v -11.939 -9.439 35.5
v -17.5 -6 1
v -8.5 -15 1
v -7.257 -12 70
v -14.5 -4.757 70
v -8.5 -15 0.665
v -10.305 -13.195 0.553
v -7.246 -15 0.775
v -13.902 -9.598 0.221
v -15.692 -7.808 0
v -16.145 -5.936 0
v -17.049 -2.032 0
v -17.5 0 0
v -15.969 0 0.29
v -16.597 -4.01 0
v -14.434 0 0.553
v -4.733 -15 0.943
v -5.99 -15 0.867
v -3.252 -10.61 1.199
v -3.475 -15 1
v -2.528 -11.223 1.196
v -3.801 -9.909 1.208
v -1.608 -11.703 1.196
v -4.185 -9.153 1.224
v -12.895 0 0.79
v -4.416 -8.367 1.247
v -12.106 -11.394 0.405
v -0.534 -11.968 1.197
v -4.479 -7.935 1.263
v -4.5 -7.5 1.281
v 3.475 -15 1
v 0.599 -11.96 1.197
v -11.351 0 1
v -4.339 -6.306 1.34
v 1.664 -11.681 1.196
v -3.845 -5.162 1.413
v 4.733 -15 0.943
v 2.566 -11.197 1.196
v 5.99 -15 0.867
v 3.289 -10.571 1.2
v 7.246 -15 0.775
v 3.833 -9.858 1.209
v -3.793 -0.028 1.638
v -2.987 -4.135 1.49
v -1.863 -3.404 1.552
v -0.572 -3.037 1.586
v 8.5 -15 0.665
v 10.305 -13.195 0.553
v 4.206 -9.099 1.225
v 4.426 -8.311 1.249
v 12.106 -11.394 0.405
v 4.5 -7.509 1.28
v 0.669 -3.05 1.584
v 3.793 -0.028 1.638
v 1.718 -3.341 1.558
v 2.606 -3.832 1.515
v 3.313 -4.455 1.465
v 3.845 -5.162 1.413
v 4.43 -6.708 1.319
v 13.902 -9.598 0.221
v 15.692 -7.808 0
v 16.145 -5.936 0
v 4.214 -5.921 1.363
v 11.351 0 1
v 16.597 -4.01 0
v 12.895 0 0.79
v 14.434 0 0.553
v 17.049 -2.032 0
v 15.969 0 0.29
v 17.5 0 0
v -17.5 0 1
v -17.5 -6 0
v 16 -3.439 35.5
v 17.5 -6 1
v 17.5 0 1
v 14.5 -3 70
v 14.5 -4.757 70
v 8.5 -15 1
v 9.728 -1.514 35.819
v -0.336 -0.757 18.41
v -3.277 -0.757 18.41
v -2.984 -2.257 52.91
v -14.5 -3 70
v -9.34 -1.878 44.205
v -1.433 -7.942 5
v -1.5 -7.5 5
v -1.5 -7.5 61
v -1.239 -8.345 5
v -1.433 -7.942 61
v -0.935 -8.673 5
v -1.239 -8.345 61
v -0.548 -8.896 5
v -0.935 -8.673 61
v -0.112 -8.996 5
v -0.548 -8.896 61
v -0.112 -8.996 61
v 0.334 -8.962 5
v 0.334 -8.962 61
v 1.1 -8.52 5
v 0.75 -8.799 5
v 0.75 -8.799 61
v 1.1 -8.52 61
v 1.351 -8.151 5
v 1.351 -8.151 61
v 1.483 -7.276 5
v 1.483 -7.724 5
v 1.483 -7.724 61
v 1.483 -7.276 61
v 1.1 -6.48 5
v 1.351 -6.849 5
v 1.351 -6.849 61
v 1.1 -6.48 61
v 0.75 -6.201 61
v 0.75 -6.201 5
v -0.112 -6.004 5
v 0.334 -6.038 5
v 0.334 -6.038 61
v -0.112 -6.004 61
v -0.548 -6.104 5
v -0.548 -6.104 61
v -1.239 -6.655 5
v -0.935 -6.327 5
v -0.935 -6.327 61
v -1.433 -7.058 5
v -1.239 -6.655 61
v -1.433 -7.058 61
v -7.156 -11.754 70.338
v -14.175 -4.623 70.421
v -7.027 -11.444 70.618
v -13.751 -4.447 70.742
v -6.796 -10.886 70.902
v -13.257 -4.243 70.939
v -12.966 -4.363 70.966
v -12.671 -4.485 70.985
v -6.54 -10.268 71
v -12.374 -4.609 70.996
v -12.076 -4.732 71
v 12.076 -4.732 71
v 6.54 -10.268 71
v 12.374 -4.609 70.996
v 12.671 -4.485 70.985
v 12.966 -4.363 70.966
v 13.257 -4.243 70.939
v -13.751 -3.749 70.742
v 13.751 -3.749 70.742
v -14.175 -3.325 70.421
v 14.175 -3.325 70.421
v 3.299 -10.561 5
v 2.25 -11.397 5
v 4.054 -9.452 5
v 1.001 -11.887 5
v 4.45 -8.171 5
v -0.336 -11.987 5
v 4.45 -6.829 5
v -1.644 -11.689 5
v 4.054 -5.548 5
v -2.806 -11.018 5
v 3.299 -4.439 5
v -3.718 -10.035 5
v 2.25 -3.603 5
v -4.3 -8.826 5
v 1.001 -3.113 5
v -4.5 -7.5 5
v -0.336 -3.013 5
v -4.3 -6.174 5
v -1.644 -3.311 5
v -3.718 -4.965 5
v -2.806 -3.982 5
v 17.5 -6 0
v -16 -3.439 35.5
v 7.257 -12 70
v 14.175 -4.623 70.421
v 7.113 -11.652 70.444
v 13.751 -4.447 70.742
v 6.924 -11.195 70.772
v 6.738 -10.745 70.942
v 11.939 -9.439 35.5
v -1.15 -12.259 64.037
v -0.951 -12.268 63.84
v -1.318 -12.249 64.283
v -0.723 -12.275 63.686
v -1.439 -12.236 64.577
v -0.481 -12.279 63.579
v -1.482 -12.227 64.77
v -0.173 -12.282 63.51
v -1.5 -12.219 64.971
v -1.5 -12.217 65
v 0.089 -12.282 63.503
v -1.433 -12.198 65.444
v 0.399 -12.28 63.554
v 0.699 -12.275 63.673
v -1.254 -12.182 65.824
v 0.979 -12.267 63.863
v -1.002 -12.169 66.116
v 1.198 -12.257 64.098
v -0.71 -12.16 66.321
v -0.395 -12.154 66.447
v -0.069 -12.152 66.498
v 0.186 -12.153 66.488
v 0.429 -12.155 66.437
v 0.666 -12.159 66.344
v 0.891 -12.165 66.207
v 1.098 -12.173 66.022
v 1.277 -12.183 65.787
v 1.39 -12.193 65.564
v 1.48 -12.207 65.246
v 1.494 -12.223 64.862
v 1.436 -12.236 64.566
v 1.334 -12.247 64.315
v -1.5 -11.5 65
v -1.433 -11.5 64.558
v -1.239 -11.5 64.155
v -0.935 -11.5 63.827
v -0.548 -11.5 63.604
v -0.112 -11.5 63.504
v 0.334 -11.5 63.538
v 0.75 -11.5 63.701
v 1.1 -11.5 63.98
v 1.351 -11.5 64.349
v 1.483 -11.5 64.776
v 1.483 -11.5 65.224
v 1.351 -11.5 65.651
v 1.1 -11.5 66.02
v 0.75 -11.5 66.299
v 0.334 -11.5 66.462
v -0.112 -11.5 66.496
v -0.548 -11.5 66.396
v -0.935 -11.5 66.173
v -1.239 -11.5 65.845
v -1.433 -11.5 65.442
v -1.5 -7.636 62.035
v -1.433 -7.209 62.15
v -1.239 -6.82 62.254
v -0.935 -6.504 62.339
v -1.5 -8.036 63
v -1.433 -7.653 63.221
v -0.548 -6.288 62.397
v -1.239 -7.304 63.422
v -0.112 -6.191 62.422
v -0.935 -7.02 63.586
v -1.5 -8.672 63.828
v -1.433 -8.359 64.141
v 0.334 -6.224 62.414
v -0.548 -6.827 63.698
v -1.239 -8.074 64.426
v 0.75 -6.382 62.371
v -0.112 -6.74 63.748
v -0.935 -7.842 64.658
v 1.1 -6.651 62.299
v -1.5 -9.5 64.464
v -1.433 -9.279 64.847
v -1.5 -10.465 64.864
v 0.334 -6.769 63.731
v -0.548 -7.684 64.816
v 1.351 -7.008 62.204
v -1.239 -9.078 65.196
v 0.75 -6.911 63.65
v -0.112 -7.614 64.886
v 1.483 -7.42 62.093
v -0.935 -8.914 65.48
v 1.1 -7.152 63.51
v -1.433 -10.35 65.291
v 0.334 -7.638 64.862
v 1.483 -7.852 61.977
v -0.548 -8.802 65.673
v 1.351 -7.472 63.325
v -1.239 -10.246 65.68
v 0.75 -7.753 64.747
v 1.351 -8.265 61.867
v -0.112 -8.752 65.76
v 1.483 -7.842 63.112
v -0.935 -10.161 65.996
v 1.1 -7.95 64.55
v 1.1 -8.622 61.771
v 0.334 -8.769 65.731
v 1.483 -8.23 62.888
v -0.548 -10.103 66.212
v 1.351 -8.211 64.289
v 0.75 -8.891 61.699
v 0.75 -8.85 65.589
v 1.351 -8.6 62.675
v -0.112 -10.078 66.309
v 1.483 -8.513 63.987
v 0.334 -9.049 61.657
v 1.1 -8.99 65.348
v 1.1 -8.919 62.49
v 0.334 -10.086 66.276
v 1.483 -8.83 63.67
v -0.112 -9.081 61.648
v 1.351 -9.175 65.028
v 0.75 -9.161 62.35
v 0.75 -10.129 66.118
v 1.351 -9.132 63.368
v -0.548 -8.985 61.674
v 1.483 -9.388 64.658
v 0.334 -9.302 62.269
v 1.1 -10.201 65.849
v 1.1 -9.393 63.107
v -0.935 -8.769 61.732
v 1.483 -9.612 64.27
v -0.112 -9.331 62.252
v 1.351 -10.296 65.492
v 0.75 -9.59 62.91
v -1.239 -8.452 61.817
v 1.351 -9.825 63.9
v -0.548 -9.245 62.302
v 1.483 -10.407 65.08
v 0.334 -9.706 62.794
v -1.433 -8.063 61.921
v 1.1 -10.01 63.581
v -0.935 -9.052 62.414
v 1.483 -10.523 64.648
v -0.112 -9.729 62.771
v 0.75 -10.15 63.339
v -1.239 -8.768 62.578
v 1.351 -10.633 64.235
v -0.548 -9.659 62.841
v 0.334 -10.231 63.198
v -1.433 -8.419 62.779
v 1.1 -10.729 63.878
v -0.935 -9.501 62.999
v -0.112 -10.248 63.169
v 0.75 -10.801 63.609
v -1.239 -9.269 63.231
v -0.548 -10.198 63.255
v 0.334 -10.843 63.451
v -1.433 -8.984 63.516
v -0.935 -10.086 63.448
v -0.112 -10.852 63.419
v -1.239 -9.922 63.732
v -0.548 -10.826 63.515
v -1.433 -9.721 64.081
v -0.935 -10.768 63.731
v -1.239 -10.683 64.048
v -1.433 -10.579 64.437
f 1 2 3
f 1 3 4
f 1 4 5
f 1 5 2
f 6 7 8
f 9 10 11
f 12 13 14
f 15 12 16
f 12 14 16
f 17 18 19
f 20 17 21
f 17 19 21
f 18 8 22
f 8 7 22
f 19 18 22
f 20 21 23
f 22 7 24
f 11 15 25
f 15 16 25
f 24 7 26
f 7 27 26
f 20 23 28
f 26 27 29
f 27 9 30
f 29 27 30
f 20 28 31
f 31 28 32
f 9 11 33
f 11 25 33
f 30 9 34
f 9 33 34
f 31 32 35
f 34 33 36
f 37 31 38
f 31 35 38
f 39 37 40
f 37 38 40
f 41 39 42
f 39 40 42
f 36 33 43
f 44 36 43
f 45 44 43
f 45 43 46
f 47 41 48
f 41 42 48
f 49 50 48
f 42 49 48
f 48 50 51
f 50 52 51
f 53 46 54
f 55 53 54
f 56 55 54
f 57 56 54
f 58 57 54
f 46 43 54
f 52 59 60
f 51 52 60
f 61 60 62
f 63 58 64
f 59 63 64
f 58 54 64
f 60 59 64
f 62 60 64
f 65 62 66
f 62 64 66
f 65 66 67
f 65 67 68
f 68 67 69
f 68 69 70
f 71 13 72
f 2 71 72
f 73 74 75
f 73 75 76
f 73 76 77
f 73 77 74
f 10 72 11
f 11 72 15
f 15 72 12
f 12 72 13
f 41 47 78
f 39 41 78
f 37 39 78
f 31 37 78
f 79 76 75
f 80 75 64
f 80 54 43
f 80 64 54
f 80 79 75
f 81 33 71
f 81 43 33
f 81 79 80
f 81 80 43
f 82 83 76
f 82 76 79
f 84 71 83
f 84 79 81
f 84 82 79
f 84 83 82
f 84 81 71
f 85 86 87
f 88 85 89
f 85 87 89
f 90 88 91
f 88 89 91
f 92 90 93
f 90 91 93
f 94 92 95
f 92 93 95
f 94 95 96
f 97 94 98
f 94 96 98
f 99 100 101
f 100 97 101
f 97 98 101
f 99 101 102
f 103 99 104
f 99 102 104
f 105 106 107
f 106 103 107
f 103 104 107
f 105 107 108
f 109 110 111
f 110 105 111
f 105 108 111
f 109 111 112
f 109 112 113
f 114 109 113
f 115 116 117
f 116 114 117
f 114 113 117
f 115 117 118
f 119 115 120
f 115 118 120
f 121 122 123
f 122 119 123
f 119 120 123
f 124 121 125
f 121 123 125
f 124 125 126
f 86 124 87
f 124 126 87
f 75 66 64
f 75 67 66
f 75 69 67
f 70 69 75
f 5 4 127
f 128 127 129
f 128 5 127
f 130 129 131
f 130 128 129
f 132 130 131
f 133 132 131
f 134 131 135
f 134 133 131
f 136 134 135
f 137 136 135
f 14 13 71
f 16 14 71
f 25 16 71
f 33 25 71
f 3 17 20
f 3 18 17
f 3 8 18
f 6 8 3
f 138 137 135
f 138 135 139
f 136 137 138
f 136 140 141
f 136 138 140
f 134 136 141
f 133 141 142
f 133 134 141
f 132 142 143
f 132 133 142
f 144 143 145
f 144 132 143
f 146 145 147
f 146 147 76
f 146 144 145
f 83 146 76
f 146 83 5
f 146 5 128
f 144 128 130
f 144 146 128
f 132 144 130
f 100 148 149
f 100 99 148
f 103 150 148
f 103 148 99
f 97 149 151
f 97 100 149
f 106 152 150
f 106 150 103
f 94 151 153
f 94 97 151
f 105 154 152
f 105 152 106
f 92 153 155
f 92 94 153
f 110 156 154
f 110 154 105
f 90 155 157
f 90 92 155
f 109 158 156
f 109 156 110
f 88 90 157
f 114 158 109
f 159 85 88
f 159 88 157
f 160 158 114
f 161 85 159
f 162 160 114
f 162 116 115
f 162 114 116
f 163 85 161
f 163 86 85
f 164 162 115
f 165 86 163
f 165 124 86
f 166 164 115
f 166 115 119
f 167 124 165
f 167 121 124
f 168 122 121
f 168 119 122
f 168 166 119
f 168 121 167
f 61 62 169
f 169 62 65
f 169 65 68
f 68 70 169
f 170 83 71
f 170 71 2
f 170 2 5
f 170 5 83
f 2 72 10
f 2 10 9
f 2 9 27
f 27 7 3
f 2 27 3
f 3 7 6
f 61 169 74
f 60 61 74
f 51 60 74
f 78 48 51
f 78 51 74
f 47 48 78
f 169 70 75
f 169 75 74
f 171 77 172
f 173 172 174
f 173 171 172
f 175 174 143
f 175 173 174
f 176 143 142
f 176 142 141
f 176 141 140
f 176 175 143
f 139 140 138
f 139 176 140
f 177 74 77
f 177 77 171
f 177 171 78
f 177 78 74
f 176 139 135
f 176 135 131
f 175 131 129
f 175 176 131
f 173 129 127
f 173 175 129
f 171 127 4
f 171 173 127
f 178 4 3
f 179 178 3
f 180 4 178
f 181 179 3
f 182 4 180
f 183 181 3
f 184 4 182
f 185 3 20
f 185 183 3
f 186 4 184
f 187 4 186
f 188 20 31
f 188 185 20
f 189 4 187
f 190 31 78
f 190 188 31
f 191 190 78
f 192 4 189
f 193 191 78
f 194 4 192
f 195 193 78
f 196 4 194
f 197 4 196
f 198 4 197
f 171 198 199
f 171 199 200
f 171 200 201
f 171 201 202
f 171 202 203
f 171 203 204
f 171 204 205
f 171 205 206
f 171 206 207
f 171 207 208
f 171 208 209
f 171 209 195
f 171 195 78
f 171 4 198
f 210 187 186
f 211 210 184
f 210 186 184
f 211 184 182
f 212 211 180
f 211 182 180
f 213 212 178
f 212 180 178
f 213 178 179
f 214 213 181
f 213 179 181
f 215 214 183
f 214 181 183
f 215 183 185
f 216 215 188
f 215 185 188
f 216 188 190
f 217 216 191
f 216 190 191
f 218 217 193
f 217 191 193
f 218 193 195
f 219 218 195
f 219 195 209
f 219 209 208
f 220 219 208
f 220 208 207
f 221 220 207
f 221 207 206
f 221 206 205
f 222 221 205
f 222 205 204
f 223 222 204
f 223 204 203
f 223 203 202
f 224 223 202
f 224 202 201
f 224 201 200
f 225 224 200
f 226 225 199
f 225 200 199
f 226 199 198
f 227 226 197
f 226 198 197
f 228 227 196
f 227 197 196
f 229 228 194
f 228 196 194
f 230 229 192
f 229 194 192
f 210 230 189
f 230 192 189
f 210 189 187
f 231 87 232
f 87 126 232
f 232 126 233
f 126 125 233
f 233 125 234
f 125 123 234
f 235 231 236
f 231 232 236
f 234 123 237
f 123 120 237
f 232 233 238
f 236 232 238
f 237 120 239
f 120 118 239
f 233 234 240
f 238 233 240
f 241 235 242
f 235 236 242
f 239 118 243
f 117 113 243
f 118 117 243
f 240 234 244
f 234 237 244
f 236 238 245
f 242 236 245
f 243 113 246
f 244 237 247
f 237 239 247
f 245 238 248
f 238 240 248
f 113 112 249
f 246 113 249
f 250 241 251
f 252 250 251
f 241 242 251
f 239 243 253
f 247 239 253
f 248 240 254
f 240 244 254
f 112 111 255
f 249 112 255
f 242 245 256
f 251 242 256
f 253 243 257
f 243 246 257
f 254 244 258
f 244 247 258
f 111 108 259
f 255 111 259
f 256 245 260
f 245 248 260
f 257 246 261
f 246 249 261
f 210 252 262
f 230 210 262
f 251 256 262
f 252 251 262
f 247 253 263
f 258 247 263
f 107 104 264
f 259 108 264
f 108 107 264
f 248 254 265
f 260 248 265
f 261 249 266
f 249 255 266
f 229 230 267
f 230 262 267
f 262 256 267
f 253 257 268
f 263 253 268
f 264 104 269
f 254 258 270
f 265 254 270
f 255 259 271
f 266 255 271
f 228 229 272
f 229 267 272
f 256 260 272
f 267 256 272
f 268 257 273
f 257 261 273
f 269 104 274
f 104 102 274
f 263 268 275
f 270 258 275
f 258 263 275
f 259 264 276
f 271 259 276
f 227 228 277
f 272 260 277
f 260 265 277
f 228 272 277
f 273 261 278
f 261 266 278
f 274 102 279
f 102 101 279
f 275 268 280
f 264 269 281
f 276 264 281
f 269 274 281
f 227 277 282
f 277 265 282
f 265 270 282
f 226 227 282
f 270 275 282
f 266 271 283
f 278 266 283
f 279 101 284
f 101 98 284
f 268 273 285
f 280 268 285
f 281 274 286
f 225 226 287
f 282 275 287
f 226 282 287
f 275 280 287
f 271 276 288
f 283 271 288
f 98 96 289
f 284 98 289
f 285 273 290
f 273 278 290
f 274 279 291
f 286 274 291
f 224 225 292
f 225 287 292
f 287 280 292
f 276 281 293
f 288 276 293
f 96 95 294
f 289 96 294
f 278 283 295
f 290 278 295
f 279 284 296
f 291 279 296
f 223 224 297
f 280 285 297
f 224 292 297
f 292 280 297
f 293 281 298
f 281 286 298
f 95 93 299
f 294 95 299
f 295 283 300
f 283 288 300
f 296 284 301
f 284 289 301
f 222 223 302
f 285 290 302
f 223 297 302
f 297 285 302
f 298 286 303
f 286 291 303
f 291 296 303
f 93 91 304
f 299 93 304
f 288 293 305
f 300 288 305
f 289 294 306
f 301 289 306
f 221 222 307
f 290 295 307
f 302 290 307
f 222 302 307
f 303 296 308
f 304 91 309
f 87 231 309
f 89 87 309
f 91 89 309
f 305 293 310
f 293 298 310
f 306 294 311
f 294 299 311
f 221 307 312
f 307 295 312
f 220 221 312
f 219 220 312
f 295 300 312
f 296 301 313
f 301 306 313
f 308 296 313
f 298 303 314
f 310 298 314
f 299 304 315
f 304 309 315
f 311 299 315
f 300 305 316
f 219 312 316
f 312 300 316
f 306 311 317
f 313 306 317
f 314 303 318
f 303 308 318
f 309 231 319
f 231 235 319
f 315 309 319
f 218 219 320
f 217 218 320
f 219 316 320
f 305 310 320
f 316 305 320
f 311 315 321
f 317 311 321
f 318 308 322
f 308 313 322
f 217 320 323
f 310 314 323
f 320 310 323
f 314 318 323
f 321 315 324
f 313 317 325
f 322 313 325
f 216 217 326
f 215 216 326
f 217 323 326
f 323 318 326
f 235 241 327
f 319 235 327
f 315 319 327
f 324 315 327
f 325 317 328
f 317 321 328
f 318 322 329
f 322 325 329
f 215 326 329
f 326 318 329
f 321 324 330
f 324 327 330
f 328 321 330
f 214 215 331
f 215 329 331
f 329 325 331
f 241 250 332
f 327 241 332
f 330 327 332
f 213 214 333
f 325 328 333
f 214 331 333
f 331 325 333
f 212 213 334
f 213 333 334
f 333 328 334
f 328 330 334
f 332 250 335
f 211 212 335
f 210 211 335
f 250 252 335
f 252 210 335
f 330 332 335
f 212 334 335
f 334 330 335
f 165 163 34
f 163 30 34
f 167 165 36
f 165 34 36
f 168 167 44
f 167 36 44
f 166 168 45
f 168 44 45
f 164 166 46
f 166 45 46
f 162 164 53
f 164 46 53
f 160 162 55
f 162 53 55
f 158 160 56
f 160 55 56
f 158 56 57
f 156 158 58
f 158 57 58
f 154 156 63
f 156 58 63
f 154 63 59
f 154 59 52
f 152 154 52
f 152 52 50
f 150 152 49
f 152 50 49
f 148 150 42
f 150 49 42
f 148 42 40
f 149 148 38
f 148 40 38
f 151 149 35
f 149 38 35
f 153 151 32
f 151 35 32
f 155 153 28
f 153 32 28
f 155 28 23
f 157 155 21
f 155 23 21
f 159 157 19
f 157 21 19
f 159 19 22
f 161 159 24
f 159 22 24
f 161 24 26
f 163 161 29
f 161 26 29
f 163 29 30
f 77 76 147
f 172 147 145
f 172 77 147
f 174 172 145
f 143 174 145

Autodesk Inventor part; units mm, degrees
ref_plane "YZ Plane" through (0, 0, 0) normal (1, 0, 0) x (0, 1, 0)
ref_plane "XZ Plane" through (0, 0, 0) normal (0, 1, 0) x (-1, 0, 0)
sketch "Sketch1" plane through (0, 0, 0) normal (0, 0, 1) x (1, 0, 0)
  line L0 (0, 0) -> (17.5, 0)
  line L1 (17.5, 0) -> (17.5, -6)
  line L2 (17.5, -6) -> (8.5, -15)
  line L3 (8.5, -15) -> (0, -15)
  line L4 (0, 0) -> (0, -15)
  line L5 (0, 0) -> (-17.5, 0)
  line L6 (-17.5, 0) -> (-17.5, -6)
  line L7 (-17.5, -6) -> (-8.5, -15)
  line L8 (-8.5, -15) -> (0, -15)
  dimension "d0" = 35
  dimension "d1" = 15
  dimension "d2" = 45
  dimension "d3" = 6
ref_plane "Work Plane1" through (0, 0, 70) normal (0, 0, 1) x (1, 0, 0)
sketch "Sketch2" plane through (0, 0, 70) normal (0, 0, 1) x (1, 0, 0)
  line L0 (-17.5, -6) -> (-8.5, -15) projected
  line L1 (-17.5, 0) -> (-17.5, -6) projected
  line L2 (0, 0) -> (-17.5, 0) projected
  line L3 (0, 0) -> (17.5, 0) projected
  line L4 (17.5, 0) -> (17.5, -6) projected
  line L5 (17.5, -6) -> (8.5, -15) projected
  line L6 (8.5, -15) -> (0, -15) projected
  line L7 (-8.5, -15) -> (0, -15) projected
  line L8 (-14.5, -4.7574) -> (-7.2574, -12)
  line L9 (-7.2574, -12) -> (0, -12)
  line L10 (0, -12) -> (7.2574, -12)
  line L11 (7.2574, -12) -> (14.5, -4.7574)
  line L12 (14.5, -4.7574) -> (14.5, -3)
  line L13 (14.5, -3) -> (0, -3)
  line L14 (0, -3) -> (-14.5, -3)
  line L15 (-14.5, -3) -> (-14.5, -4.7574)
  dimension "d5" = 3
extrude "Extrusion1" add sketch "Sketch1" along normal blind 1
extrude "Extrusion2" add sketch "Sketch2" along normal blind 1 contours L15 L14 L13 L12 L11 L10 L9 L8
loft "Loft1" add section 1 edges at (-13, -10.5, 1) (0, -15, 1) (13, -10.5, 1) (17.5, -3, 1) (0, 0, 1) (-17.5, -3, 1) section 2 edges at (0, -3, 70) (14.5, -3.8787, 70) (10.8787, -8.3787, 70) (0, -12, 70) (-10.8787, -8.3787, 70) (-14.5, -3.8787, 70)
sketch "Sketch6" plane through (0, 0, 0) normal (1, 0, 0) x (0, 1, 0)
  line L0 (-15, 1) -> (-12, 70) projected
  line L1 (-12, 70) -> (-12, 71) projected
  line L2 (-12, 71) -> (-3, 71) projected
  line L3 (-3, 71) -> (-3, 70) projected
  line L4 (-3, 70) -> (0, 1) projected
  line L5 (0, 1) -> (0, 0) projected
  line L6 (0, 0) -> (-15, 0) projected
  line L7 (-15, 0) -> (-15, 1) projected
  line L8 (-6, 0) -> (-15, 0) projected
  line L9 (-7.5, 0) -> (-7.5, 61)
  line L10 (-11.5, 65) -> (-15, 65)
  arc A0 (-7.5, 61) -> (-11.5, 65) centre (-11.5, 61) ccw
  point P0 (-7.5, 65)
  dimension "d20" = 65
  dimension "d21" = 4
  dimension "d23" = 7.5
  dimension "d24" = 15
sketch "Sketch7" plane through (0, 0, 0) normal (0, 0, -1) x (-1, 0, 0)
  line L0 (17.5, 0) -> (17.5, -6) projected
  line L1 (17.5, -6) -> (8.5, -15) projected
  line L2 (8.5, -15) -> (-8.5, -15) projected
  line L3 (-8.5, -15) -> (-17.5, -6) projected
  line L4 (-17.5, -6) -> (-17.5, 0) projected
  line L5 (-17.5, 0) -> (17.5, 0) projected
  line L6 (17.5, -6) -> (8.5, -15) projected
  line L7 (17.5, 0) -> (17.5, -6) projected
  line L8 (-17.5, 0) -> (17.5, 0) projected
  line L9 (-17.5, -6) -> (-17.5, 0) projected
  line L10 (-8.5, -15) -> (-17.5, -6) projected
  line L11 (8.5, -15) -> (-8.5, -15) projected
  circle A0 centre (0, -7.5) radius 1.5
  point P0 (0, 0)
  dimension "d25" = 7.5
  dimension "d26" = 3
  dimension "d27" = 17.5
sweep "Sweep1" cut profiles "Sketch7" path "Sketch6" path curves L9 A0 L10 contours A0
sketch "Sketch8" plane through (0, 0, 0) normal (0, 0, -1) x (-1, 0, 0)
  circle A0 centre (0, -7.5) radius 1.5 projected
  line L0 (17.5, -6) -> (8.5, -15) projected
  line L1 (17.5, 0) -> (17.5, -6) projected
  line L2 (-17.5, 0) -> (17.5, 0) projected
  line L3 (-17.5, -6) -> (-17.5, 0) projected
  line L4 (-8.5, -15) -> (-17.5, -6) projected
  line L5 (8.5, -15) -> (-8.5, -15) projected
  circle A1 centre (0, -7.5) radius 4.5
  point P0 (0, 0)
  dimension "d30" = 9
extrude "Extrusion4" cut sketch "Sketch8" against normal blind 5 contours A1
fillet "Fillet1" radius 0.5 1 edges at (4.5, -7.5, 0)
fillet "Fillet2" radius 2 6 edges at (10.8787, -8.3787, 71) (0, -12, 71) (-10.8787, -8.3787, 71) (-14.5, -3.8787, 71) (0, -3, 71) (14.5, -3.8787, 71)
sketch "Sketch9" plane through (-17.5, 0, 1) normal (0, 0.9990562, 0.0434372) x (1, 0, 0)
  line L0 (0, 0.9991) -> (0, 0) projected
  line L1 (35, 0.9991) -> (0, 0.9991) projected
  line L2 (35, 0.9991) -> (35, 0) projected
  arc A0 (0, 0.9991) -> (35, 0.9991) centre (17.5, 89.2813) ccw
  point P0 (17.5, 0.9991)
  dimension "d35" = 90
extrude "Extrusion5" cut sketch "Sketch9" against normal through all
properties part number "_3DPrint"
